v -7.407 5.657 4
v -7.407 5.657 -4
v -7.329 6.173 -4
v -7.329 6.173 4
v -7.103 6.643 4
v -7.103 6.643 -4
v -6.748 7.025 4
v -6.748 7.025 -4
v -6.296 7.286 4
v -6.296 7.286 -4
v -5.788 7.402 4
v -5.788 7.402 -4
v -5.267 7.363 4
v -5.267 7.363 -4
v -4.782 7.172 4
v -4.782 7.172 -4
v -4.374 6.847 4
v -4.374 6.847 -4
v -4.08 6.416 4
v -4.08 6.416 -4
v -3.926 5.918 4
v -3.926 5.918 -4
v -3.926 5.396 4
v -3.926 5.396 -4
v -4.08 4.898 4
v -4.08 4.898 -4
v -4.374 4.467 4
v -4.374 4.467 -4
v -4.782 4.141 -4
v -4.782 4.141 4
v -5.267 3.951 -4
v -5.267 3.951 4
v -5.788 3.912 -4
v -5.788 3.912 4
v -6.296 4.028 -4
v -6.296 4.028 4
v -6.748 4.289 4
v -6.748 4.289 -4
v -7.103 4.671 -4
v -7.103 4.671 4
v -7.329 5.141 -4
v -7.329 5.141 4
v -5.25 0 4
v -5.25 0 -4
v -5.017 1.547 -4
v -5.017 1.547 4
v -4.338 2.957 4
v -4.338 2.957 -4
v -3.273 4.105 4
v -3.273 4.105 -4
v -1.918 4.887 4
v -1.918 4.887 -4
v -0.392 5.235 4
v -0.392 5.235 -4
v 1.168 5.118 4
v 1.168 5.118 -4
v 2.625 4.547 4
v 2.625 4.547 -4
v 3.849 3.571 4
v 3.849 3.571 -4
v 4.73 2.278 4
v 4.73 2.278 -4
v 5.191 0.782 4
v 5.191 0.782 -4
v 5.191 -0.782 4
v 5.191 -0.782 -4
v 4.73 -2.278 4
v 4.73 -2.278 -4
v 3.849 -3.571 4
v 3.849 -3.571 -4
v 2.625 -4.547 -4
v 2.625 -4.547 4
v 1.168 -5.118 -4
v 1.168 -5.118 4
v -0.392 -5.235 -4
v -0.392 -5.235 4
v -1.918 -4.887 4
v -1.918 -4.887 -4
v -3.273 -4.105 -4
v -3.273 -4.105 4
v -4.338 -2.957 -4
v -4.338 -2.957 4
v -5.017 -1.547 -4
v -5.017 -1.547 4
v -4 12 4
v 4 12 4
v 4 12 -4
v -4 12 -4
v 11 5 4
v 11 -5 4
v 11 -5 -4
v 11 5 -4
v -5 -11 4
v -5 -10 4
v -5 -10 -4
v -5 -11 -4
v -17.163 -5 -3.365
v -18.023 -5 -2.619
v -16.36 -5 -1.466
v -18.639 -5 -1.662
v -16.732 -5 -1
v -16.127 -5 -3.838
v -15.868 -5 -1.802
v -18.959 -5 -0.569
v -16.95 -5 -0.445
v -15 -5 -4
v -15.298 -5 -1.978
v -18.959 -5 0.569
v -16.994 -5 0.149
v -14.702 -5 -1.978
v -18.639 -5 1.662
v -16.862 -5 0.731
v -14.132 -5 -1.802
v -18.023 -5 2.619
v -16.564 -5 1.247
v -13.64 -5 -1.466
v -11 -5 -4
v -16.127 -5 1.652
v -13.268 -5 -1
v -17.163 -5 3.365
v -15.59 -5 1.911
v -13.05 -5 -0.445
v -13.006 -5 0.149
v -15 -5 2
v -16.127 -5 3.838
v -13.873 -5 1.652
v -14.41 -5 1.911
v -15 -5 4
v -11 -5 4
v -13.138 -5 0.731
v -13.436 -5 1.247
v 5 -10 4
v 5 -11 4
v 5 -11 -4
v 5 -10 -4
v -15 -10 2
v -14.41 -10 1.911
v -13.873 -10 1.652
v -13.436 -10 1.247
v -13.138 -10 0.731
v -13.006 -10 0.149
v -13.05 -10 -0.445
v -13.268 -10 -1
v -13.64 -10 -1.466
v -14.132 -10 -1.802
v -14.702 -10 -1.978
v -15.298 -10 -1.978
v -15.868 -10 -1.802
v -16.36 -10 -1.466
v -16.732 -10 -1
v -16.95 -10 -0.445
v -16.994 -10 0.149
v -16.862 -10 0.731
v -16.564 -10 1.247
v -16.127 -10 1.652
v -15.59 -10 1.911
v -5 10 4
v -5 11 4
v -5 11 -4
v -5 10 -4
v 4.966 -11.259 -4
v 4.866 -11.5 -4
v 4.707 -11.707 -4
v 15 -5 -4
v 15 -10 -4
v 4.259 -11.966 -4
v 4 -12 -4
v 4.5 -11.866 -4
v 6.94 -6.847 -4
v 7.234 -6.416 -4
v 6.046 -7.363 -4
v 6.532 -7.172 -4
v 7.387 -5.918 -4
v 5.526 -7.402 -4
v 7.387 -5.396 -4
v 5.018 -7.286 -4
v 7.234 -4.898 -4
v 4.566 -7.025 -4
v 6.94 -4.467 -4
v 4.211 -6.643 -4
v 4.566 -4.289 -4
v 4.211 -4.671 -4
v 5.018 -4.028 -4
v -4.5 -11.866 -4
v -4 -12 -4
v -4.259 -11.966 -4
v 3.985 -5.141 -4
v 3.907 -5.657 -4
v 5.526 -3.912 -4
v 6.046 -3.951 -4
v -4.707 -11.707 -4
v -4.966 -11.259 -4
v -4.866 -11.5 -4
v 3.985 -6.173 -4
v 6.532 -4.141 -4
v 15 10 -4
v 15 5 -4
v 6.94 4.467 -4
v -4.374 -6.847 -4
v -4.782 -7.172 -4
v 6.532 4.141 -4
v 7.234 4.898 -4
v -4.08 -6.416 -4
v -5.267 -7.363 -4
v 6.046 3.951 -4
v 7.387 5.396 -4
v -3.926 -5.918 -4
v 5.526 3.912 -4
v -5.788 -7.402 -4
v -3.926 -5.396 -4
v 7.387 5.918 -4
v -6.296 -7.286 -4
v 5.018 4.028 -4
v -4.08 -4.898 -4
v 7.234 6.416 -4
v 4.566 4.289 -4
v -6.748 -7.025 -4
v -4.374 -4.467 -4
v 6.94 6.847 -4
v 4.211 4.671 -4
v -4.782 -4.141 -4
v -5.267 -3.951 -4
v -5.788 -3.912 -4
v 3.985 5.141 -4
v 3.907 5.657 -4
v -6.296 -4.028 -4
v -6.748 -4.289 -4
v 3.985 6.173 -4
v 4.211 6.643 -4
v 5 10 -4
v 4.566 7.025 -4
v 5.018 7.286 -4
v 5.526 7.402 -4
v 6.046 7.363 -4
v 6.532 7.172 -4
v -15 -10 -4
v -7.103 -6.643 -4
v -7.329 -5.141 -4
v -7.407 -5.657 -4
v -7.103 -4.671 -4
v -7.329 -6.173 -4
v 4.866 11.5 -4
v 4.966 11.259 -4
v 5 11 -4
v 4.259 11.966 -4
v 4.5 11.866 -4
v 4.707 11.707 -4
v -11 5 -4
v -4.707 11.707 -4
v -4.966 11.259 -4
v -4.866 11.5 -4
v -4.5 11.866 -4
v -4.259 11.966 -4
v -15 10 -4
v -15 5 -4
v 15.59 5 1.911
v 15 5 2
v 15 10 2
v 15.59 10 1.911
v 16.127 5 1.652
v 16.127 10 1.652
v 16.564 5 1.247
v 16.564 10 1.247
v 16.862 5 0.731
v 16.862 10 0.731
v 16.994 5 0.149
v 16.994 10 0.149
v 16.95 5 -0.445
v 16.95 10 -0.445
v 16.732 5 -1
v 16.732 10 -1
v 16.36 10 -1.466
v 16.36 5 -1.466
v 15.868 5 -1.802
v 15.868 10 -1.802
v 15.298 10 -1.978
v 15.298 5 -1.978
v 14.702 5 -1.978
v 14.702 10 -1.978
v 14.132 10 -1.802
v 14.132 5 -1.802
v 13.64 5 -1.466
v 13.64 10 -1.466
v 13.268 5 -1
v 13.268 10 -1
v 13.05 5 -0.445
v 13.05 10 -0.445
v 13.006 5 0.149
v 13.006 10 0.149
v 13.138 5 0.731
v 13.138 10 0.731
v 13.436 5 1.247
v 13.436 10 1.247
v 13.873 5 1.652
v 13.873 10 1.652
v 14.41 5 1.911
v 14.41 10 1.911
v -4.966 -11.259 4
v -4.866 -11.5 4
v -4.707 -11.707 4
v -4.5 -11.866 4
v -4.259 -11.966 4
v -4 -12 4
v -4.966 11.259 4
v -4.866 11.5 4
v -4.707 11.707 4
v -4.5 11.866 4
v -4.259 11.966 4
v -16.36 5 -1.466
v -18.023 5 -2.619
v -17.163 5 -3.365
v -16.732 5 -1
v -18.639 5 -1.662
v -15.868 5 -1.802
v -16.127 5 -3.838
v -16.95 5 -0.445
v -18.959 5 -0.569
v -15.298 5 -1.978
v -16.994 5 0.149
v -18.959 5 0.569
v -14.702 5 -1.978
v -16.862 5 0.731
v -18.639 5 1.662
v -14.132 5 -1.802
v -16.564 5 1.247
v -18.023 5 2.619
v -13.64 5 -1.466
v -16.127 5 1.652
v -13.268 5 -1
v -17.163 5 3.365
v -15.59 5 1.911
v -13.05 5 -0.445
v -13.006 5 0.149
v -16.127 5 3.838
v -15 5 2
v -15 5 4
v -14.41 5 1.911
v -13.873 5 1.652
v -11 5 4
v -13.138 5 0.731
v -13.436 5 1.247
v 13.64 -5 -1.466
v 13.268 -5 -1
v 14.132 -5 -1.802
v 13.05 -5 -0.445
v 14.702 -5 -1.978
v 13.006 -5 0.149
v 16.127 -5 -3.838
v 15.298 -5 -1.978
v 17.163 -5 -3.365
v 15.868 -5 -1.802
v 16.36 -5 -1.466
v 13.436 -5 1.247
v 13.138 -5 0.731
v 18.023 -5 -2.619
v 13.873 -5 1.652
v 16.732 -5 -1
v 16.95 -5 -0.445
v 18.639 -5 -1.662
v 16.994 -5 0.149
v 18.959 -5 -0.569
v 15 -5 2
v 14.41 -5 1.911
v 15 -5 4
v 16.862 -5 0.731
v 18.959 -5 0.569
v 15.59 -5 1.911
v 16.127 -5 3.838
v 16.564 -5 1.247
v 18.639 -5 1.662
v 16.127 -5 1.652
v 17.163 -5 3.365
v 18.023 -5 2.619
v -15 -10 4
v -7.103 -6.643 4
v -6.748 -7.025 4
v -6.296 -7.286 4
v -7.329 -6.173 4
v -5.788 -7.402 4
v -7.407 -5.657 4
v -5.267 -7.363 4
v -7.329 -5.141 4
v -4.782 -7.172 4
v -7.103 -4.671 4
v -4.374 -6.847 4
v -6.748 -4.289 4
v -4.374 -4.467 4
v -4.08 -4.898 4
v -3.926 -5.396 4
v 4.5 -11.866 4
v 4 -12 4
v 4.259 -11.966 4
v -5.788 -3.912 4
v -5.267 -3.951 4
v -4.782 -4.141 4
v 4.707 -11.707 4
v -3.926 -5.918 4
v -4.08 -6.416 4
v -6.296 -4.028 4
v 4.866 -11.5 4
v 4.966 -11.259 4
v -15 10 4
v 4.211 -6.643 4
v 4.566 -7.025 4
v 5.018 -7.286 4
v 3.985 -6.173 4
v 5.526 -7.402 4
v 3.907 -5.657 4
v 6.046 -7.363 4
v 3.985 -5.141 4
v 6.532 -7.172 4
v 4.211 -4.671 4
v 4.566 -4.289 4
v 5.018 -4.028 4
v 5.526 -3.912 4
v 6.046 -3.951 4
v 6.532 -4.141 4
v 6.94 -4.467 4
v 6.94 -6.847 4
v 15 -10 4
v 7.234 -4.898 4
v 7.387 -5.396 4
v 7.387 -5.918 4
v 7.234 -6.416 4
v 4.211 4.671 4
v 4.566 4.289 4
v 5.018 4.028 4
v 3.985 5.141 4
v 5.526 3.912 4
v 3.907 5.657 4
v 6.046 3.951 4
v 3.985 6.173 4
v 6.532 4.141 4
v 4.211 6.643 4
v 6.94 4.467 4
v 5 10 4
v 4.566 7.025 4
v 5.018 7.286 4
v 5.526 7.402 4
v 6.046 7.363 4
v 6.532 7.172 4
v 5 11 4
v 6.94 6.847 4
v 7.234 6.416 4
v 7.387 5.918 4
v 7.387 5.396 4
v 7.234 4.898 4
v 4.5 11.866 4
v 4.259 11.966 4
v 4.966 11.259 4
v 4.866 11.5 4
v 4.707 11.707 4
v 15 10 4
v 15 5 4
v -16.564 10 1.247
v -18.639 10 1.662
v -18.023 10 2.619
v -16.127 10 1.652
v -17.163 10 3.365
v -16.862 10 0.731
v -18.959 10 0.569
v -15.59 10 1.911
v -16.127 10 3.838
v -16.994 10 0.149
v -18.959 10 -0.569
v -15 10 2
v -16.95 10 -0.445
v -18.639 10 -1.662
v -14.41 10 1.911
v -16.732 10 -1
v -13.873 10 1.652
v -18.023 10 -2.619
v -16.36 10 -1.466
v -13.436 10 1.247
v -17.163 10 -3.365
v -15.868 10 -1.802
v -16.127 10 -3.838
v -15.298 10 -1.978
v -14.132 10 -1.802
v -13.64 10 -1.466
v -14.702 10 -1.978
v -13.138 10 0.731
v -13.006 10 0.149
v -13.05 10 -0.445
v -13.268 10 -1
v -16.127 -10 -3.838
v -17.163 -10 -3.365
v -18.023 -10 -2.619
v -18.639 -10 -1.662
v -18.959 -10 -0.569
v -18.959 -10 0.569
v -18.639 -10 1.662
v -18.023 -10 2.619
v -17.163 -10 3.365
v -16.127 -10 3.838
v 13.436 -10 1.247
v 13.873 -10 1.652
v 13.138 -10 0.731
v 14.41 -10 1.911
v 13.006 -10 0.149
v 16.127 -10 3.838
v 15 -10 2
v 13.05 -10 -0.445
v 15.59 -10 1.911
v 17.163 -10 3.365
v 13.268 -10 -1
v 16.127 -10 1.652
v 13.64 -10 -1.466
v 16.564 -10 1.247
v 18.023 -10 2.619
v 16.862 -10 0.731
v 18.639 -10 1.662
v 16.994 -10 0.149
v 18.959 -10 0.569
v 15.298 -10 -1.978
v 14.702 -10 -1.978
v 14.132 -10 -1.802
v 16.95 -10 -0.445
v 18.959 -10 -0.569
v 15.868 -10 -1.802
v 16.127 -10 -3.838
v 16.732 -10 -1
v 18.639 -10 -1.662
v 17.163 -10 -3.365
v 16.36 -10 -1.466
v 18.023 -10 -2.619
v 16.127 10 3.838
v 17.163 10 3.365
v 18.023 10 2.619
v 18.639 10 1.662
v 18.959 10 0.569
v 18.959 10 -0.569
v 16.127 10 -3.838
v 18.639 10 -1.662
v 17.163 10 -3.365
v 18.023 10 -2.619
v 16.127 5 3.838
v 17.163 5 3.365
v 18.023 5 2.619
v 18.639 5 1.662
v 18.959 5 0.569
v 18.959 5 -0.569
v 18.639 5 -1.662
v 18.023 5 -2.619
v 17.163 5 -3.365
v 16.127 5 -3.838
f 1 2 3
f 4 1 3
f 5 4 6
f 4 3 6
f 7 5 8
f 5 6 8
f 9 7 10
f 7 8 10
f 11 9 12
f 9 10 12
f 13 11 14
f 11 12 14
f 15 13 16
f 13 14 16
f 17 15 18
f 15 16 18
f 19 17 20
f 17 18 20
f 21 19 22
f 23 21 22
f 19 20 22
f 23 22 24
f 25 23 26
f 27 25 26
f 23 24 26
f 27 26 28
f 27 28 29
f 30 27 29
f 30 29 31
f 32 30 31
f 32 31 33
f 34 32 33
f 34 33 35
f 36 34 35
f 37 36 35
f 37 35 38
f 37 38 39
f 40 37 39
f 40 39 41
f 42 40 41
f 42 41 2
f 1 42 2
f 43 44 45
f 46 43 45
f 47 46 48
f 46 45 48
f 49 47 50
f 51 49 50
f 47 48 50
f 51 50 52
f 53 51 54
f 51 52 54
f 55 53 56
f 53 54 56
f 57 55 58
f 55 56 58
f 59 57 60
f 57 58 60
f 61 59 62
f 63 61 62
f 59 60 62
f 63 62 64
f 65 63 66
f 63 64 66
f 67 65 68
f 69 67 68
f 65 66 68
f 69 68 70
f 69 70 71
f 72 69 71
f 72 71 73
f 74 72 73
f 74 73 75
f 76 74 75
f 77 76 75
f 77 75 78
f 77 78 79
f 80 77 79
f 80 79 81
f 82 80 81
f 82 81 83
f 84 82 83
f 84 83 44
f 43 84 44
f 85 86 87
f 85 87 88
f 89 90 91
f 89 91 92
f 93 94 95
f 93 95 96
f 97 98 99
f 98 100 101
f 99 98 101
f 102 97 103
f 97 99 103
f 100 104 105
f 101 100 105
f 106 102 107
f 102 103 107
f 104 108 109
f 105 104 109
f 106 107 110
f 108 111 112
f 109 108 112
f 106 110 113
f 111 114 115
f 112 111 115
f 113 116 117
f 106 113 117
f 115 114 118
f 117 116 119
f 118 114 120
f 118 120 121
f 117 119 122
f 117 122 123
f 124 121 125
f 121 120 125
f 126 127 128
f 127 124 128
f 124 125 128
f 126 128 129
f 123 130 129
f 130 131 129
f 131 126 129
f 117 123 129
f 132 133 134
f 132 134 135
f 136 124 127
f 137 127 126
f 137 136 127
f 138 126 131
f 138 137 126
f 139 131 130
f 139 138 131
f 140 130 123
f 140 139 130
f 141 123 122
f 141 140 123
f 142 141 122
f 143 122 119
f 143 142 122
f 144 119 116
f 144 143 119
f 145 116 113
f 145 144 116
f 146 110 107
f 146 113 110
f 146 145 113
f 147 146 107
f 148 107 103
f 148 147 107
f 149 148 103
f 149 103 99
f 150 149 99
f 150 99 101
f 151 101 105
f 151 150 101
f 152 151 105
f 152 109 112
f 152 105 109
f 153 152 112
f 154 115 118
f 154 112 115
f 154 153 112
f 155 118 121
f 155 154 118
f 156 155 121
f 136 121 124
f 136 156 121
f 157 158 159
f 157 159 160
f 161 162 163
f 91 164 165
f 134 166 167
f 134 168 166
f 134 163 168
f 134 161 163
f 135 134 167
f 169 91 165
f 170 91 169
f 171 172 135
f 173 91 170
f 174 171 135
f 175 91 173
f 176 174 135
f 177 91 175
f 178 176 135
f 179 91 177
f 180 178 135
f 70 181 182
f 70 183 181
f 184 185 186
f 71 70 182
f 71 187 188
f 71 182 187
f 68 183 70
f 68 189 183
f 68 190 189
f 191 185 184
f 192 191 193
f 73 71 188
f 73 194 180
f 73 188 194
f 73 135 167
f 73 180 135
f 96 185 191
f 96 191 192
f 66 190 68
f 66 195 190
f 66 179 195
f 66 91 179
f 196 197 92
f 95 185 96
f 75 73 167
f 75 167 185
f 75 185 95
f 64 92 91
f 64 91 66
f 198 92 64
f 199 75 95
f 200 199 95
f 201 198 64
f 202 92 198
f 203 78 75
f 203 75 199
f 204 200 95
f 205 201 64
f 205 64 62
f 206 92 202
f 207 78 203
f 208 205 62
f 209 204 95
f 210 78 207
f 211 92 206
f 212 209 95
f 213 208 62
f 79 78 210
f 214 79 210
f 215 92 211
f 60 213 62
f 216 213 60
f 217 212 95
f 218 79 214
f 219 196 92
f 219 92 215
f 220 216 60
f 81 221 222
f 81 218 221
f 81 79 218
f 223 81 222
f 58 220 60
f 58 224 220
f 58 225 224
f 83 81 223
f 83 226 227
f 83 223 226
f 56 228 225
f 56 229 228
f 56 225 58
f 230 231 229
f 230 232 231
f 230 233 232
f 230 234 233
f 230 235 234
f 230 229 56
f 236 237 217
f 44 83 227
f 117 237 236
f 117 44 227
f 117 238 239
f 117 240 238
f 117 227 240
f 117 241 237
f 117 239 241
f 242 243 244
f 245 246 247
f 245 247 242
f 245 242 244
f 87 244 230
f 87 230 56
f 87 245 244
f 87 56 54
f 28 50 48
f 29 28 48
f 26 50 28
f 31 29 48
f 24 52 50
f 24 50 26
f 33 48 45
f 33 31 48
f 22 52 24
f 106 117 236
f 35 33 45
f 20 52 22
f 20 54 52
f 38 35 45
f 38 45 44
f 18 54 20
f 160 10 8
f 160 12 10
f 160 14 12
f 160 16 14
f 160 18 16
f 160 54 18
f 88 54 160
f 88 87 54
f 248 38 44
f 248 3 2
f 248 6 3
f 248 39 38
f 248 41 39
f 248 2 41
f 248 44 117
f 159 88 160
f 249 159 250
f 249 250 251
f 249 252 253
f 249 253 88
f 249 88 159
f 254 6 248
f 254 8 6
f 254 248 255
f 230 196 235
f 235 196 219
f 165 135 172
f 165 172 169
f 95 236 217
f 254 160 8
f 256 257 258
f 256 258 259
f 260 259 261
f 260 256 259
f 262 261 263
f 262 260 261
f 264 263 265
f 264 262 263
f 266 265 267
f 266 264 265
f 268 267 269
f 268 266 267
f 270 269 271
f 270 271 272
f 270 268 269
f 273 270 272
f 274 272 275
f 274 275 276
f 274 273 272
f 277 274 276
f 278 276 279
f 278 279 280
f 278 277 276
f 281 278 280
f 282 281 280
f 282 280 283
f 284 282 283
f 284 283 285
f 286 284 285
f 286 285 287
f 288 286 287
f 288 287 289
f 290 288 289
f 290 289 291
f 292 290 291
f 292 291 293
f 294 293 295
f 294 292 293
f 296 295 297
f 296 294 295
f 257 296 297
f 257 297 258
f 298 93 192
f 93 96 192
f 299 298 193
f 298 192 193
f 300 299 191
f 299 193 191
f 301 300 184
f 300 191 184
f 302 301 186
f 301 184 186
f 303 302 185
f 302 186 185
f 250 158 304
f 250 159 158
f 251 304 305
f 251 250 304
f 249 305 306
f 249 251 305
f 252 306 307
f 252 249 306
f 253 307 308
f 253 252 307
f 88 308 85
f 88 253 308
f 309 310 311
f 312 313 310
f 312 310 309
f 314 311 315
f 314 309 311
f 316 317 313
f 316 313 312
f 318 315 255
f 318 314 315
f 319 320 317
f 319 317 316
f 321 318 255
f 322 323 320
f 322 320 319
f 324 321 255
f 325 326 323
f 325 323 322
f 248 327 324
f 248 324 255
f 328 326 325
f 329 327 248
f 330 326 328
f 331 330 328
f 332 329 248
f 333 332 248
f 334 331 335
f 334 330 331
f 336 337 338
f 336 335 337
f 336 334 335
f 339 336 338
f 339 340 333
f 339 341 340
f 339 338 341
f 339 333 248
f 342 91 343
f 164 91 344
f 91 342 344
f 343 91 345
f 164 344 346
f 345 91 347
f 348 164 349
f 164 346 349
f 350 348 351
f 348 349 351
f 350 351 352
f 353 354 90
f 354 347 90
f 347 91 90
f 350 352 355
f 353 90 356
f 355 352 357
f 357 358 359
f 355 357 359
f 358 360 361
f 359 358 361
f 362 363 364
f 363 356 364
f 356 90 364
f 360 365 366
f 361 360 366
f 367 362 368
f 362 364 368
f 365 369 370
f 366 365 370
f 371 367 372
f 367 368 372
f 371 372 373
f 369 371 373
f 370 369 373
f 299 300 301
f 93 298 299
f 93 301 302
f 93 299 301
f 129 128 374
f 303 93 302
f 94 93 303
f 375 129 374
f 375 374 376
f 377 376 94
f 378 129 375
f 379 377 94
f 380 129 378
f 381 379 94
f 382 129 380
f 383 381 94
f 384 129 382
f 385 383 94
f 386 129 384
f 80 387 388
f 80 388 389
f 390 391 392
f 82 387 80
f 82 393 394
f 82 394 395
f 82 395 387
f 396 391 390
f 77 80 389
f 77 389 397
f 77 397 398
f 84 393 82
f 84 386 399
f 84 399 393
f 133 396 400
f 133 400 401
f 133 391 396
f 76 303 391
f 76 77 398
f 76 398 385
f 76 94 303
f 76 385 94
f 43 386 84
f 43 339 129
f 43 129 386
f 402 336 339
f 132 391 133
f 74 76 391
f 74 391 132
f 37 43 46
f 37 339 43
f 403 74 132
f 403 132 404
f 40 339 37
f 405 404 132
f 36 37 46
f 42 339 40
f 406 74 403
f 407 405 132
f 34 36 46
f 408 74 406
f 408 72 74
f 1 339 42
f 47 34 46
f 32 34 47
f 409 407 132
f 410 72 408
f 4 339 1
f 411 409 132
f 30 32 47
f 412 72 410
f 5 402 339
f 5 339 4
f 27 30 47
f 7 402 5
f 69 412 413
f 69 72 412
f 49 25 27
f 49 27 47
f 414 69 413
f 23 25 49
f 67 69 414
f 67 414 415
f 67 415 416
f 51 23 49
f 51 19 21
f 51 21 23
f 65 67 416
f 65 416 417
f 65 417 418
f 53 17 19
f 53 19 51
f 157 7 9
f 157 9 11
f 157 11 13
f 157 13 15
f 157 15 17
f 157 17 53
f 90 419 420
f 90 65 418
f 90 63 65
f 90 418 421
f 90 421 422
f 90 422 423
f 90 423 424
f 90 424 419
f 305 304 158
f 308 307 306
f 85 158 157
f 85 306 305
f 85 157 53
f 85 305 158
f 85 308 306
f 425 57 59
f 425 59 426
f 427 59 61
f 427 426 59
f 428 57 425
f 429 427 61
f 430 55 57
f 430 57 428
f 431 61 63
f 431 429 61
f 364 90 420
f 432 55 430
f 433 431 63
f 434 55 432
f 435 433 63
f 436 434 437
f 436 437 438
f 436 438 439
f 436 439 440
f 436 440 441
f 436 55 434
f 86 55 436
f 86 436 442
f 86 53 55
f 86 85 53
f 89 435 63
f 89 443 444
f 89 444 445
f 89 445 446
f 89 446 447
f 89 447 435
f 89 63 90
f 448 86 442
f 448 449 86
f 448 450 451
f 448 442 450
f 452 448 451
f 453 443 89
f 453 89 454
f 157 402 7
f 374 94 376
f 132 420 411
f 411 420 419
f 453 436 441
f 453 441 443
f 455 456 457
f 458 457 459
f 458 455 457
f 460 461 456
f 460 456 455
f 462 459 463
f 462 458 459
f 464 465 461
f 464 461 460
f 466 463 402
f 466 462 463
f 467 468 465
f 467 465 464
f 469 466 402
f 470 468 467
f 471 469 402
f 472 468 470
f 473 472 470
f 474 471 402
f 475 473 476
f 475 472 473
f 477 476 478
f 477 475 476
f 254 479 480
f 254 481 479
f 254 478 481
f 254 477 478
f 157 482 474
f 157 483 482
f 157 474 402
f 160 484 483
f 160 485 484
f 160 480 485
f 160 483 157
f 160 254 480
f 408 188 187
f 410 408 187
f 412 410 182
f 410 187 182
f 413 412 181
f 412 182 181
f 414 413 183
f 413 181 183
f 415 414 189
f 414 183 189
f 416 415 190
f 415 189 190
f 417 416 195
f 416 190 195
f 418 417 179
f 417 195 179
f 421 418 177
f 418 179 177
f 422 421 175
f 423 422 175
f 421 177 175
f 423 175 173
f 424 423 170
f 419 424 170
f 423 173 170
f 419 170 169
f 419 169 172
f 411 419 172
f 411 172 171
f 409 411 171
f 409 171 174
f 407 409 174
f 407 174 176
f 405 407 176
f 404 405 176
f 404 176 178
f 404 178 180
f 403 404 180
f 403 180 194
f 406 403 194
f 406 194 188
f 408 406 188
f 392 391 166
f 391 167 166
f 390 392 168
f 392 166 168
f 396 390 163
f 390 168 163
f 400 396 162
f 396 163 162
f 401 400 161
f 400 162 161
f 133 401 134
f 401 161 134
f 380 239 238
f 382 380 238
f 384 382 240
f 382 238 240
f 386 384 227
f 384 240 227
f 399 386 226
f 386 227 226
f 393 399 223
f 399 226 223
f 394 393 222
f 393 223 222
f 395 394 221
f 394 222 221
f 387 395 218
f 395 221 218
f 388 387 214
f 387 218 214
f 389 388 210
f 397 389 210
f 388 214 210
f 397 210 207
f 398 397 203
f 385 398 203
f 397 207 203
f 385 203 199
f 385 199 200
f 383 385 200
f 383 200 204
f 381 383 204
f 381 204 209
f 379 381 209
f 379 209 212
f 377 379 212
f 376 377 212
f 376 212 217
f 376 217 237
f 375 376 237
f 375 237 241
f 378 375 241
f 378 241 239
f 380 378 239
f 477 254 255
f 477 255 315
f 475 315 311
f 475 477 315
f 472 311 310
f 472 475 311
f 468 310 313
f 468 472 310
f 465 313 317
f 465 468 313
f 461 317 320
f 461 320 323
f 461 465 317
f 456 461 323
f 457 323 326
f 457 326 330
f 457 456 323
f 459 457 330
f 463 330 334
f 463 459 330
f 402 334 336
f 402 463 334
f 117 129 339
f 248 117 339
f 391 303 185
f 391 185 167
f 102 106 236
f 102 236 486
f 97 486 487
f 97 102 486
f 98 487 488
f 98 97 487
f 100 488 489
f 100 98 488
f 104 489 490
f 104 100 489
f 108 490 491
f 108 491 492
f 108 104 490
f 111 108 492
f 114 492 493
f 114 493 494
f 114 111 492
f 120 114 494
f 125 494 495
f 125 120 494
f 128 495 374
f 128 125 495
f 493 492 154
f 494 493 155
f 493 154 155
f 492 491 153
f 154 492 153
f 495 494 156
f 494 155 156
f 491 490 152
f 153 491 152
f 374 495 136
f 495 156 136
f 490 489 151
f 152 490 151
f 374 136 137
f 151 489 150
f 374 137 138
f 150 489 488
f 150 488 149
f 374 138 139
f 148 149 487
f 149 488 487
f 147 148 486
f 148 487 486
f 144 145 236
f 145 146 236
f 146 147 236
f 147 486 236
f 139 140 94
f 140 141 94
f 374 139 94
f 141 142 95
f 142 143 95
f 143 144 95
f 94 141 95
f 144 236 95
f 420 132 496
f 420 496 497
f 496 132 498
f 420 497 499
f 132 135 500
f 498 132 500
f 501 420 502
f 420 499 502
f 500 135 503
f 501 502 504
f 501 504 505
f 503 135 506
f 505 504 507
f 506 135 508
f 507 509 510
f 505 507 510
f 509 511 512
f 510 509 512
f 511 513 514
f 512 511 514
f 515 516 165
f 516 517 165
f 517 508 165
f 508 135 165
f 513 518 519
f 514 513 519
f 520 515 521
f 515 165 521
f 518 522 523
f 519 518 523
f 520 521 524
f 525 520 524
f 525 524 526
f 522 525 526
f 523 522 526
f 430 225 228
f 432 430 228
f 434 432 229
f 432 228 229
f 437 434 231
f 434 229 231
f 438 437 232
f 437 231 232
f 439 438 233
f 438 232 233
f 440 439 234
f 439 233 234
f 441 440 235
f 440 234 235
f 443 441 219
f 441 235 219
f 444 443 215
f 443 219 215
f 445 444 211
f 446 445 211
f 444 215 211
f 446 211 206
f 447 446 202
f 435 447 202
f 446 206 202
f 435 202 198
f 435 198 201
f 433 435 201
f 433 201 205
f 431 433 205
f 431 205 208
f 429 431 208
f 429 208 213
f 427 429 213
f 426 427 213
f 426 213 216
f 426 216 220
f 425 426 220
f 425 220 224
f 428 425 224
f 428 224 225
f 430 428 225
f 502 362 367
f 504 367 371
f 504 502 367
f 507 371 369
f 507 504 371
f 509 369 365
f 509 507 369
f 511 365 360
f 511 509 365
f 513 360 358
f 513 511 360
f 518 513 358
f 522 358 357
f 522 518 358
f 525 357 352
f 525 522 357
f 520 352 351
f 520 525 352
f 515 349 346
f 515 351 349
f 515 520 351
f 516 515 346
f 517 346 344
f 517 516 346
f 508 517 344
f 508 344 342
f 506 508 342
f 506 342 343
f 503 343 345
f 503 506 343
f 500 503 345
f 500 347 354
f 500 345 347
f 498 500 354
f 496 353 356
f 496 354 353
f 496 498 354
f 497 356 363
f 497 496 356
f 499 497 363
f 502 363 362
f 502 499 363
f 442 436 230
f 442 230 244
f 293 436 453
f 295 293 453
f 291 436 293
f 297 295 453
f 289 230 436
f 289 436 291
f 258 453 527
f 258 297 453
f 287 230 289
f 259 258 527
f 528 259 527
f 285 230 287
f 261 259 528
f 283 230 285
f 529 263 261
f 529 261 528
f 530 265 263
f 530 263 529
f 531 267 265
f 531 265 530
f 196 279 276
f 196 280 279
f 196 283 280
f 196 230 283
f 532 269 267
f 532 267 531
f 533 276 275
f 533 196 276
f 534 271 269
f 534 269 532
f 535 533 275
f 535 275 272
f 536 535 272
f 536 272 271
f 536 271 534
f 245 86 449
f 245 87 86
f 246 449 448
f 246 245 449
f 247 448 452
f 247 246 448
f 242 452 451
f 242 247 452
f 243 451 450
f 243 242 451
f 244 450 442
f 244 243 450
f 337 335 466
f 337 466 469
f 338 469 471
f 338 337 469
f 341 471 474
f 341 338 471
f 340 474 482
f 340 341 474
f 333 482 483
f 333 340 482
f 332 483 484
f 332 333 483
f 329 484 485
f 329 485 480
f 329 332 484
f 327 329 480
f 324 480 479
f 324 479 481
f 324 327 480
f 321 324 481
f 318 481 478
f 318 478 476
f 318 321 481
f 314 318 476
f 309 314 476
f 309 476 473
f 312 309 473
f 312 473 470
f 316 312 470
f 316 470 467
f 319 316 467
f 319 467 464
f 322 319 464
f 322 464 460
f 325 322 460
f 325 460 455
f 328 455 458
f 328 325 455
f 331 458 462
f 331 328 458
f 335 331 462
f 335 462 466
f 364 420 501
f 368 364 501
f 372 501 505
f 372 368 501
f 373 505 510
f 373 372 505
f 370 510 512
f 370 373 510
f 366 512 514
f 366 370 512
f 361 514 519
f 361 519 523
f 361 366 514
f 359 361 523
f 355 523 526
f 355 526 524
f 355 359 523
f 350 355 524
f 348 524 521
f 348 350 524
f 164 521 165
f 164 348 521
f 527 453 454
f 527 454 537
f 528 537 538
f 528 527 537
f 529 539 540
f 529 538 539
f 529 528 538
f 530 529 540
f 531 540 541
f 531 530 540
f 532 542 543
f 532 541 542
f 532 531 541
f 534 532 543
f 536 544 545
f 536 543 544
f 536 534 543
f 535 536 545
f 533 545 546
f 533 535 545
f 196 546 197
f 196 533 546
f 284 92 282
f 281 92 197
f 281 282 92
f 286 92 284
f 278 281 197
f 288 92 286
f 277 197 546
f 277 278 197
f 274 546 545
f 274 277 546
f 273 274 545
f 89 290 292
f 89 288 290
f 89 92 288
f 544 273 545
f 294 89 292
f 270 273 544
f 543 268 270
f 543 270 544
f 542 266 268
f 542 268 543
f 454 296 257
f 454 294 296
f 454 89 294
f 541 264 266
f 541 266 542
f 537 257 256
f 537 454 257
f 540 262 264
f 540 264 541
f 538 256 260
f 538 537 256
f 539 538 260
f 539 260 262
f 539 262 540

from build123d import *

# Parameters (mm, degrees)
SKETCH1_R                    = 2
BOSS_EXTRUDE1_DEPTH          = 10
CUT_EXTRUDE2_REACH           = 24.913
SKETCH3_W                    = 8
SKETCH3_H                    = 10
BOSS_EXTRUDE2_DEPTH          = 8
F_10_5_10_5_DIAMETER_HOLE1_D = 10.5
F_3_5_3_5_DIAMETER_HOLE1_D   = 3.5
FILLET1_R                    = 1


with BuildPart() as part:
    # Sketch1 → Boss-Extrude1 (new, symmetric)
    with BuildSketch(Plane(origin=(0, 0, 0), x_dir=(1, 0, 0), z_dir=(0, 1, 0))):
        with BuildLine():
            Line((15, 4), (-15, 4))
            ThreePointArc((-15, 4), (-19, 0), (-15, -4))
            Line((-15, -4), (15, -4))
            ThreePointArc((15, -4), (19, 0), (15, 4))
        make_face()
        with Locations(Location((-15, 0, 0), (0, 0, 270))):
            Circle(SKETCH1_R, mode=Mode.SUBTRACT)
        with Locations(Location((15, 0, 0), (0, 0, 270))):
            Circle(SKETCH1_R, mode=Mode.SUBTRACT)
    extrude(amount=BOSS_EXTRUDE1_DEPTH, both=True)

    # Cut-Extrude2: up to this face of the body (flat: up to its plane)
    cut_extrude2_end = Plane(part.part.faces().sort_by_distance((0, 0, -4))[0])
    # Sketch3 → Cut-Extrude2 (cut, up to the picked face)
    with BuildSketch(Plane.XY.offset(4), mode=Mode.PRIVATE) as cut_extrude2_sk1:
        with Locations((-15, 0)):
            Rectangle(SKETCH3_W, SKETCH3_H)
    cut_extrude2_tool1 = split(extrude(cut_extrude2_sk1.sketch, amount=-CUT_EXTRUDE2_REACH, mode=Mode.PRIVATE), bisect_by=cut_extrude2_end, keep=Keep.BOTH, mode=Mode.PRIVATE)
    # Sketch3 → Cut-Extrude2 (cut, up to the picked face)
    with BuildSketch(Plane.XY.offset(4), mode=Mode.PRIVATE) as cut_extrude2_sk2:
        with Locations((15, 0)):
            Rectangle(SKETCH3_W, SKETCH3_H)
    cut_extrude2_tool2 = split(extrude(cut_extrude2_sk2.sketch, amount=-CUT_EXTRUDE2_REACH, mode=Mode.PRIVATE), bisect_by=cut_extrude2_end, keep=Keep.BOTH, mode=Mode.PRIVATE)
    add(cut_extrude2_tool1.solids().sort_by(Axis((-15, 0, 4), (0, 0, -1)))[0], mode=Mode.SUBTRACT)
    add(cut_extrude2_tool2.solids().sort_by(Axis((15, 0, 4), (0, 0, -1)))[0], mode=Mode.SUBTRACT)

    # Sketch2 → Boss-Extrude2 (add)
    with BuildSketch(Plane.XY.offset(4)):
        with BuildLine():
            Line((-5, -9.797958971), (-5, -12))
            Line((-5, -12), (5, -12))
            Line((5, -12), (5, -9.797958971))
            ThreePointArc((5, -9.797958971), (11, 0), (5, 9.797958971))
            Line((5, 9.797958971), (5, 12))
            Line((5, 12), (-5, 12))
            Line((-5, 12), (-5, 9.797958971))
            ThreePointArc((-5, 9.797958971), (-11, 0), (-5, -9.797958971))
        make_face()
    extrude(amount=-BOSS_EXTRUDE2_DEPTH)

    # Ø10.5 (10.5) Diameter Hole1 (through all)
    with Locations(Plane.XY.offset(4)):
        with Locations((0, 0)):
            Hole(F_10_5_10_5_DIAMETER_HOLE1_D / 2)

    # Ø3.5 (3.5) Diameter Hole1 (through all)
    with Locations(Plane(origin=(5.656854249, 5.656854249, 4), x_dir=(1, 0, 0), z_dir=(0, 0, 1))):
        with Locations((0, 0), (0, -11.313708498), (-11.313708498, 0), (-11.313708498, -11.313708498)):
            Hole(F_3_5_3_5_DIAMETER_HOLE1_D / 2)

    # Fillet1
    fillet1_edges = [part.edges().sort_by_distance(p)[0] for p in [
        (-5, -12, 0),
        (-5, 12, 0),
        (5, 12, 0),
        (5, -12, 0),
    ]]
    fillet(fillet1_edges, radius=FILLET1_R)


solid = part.part
